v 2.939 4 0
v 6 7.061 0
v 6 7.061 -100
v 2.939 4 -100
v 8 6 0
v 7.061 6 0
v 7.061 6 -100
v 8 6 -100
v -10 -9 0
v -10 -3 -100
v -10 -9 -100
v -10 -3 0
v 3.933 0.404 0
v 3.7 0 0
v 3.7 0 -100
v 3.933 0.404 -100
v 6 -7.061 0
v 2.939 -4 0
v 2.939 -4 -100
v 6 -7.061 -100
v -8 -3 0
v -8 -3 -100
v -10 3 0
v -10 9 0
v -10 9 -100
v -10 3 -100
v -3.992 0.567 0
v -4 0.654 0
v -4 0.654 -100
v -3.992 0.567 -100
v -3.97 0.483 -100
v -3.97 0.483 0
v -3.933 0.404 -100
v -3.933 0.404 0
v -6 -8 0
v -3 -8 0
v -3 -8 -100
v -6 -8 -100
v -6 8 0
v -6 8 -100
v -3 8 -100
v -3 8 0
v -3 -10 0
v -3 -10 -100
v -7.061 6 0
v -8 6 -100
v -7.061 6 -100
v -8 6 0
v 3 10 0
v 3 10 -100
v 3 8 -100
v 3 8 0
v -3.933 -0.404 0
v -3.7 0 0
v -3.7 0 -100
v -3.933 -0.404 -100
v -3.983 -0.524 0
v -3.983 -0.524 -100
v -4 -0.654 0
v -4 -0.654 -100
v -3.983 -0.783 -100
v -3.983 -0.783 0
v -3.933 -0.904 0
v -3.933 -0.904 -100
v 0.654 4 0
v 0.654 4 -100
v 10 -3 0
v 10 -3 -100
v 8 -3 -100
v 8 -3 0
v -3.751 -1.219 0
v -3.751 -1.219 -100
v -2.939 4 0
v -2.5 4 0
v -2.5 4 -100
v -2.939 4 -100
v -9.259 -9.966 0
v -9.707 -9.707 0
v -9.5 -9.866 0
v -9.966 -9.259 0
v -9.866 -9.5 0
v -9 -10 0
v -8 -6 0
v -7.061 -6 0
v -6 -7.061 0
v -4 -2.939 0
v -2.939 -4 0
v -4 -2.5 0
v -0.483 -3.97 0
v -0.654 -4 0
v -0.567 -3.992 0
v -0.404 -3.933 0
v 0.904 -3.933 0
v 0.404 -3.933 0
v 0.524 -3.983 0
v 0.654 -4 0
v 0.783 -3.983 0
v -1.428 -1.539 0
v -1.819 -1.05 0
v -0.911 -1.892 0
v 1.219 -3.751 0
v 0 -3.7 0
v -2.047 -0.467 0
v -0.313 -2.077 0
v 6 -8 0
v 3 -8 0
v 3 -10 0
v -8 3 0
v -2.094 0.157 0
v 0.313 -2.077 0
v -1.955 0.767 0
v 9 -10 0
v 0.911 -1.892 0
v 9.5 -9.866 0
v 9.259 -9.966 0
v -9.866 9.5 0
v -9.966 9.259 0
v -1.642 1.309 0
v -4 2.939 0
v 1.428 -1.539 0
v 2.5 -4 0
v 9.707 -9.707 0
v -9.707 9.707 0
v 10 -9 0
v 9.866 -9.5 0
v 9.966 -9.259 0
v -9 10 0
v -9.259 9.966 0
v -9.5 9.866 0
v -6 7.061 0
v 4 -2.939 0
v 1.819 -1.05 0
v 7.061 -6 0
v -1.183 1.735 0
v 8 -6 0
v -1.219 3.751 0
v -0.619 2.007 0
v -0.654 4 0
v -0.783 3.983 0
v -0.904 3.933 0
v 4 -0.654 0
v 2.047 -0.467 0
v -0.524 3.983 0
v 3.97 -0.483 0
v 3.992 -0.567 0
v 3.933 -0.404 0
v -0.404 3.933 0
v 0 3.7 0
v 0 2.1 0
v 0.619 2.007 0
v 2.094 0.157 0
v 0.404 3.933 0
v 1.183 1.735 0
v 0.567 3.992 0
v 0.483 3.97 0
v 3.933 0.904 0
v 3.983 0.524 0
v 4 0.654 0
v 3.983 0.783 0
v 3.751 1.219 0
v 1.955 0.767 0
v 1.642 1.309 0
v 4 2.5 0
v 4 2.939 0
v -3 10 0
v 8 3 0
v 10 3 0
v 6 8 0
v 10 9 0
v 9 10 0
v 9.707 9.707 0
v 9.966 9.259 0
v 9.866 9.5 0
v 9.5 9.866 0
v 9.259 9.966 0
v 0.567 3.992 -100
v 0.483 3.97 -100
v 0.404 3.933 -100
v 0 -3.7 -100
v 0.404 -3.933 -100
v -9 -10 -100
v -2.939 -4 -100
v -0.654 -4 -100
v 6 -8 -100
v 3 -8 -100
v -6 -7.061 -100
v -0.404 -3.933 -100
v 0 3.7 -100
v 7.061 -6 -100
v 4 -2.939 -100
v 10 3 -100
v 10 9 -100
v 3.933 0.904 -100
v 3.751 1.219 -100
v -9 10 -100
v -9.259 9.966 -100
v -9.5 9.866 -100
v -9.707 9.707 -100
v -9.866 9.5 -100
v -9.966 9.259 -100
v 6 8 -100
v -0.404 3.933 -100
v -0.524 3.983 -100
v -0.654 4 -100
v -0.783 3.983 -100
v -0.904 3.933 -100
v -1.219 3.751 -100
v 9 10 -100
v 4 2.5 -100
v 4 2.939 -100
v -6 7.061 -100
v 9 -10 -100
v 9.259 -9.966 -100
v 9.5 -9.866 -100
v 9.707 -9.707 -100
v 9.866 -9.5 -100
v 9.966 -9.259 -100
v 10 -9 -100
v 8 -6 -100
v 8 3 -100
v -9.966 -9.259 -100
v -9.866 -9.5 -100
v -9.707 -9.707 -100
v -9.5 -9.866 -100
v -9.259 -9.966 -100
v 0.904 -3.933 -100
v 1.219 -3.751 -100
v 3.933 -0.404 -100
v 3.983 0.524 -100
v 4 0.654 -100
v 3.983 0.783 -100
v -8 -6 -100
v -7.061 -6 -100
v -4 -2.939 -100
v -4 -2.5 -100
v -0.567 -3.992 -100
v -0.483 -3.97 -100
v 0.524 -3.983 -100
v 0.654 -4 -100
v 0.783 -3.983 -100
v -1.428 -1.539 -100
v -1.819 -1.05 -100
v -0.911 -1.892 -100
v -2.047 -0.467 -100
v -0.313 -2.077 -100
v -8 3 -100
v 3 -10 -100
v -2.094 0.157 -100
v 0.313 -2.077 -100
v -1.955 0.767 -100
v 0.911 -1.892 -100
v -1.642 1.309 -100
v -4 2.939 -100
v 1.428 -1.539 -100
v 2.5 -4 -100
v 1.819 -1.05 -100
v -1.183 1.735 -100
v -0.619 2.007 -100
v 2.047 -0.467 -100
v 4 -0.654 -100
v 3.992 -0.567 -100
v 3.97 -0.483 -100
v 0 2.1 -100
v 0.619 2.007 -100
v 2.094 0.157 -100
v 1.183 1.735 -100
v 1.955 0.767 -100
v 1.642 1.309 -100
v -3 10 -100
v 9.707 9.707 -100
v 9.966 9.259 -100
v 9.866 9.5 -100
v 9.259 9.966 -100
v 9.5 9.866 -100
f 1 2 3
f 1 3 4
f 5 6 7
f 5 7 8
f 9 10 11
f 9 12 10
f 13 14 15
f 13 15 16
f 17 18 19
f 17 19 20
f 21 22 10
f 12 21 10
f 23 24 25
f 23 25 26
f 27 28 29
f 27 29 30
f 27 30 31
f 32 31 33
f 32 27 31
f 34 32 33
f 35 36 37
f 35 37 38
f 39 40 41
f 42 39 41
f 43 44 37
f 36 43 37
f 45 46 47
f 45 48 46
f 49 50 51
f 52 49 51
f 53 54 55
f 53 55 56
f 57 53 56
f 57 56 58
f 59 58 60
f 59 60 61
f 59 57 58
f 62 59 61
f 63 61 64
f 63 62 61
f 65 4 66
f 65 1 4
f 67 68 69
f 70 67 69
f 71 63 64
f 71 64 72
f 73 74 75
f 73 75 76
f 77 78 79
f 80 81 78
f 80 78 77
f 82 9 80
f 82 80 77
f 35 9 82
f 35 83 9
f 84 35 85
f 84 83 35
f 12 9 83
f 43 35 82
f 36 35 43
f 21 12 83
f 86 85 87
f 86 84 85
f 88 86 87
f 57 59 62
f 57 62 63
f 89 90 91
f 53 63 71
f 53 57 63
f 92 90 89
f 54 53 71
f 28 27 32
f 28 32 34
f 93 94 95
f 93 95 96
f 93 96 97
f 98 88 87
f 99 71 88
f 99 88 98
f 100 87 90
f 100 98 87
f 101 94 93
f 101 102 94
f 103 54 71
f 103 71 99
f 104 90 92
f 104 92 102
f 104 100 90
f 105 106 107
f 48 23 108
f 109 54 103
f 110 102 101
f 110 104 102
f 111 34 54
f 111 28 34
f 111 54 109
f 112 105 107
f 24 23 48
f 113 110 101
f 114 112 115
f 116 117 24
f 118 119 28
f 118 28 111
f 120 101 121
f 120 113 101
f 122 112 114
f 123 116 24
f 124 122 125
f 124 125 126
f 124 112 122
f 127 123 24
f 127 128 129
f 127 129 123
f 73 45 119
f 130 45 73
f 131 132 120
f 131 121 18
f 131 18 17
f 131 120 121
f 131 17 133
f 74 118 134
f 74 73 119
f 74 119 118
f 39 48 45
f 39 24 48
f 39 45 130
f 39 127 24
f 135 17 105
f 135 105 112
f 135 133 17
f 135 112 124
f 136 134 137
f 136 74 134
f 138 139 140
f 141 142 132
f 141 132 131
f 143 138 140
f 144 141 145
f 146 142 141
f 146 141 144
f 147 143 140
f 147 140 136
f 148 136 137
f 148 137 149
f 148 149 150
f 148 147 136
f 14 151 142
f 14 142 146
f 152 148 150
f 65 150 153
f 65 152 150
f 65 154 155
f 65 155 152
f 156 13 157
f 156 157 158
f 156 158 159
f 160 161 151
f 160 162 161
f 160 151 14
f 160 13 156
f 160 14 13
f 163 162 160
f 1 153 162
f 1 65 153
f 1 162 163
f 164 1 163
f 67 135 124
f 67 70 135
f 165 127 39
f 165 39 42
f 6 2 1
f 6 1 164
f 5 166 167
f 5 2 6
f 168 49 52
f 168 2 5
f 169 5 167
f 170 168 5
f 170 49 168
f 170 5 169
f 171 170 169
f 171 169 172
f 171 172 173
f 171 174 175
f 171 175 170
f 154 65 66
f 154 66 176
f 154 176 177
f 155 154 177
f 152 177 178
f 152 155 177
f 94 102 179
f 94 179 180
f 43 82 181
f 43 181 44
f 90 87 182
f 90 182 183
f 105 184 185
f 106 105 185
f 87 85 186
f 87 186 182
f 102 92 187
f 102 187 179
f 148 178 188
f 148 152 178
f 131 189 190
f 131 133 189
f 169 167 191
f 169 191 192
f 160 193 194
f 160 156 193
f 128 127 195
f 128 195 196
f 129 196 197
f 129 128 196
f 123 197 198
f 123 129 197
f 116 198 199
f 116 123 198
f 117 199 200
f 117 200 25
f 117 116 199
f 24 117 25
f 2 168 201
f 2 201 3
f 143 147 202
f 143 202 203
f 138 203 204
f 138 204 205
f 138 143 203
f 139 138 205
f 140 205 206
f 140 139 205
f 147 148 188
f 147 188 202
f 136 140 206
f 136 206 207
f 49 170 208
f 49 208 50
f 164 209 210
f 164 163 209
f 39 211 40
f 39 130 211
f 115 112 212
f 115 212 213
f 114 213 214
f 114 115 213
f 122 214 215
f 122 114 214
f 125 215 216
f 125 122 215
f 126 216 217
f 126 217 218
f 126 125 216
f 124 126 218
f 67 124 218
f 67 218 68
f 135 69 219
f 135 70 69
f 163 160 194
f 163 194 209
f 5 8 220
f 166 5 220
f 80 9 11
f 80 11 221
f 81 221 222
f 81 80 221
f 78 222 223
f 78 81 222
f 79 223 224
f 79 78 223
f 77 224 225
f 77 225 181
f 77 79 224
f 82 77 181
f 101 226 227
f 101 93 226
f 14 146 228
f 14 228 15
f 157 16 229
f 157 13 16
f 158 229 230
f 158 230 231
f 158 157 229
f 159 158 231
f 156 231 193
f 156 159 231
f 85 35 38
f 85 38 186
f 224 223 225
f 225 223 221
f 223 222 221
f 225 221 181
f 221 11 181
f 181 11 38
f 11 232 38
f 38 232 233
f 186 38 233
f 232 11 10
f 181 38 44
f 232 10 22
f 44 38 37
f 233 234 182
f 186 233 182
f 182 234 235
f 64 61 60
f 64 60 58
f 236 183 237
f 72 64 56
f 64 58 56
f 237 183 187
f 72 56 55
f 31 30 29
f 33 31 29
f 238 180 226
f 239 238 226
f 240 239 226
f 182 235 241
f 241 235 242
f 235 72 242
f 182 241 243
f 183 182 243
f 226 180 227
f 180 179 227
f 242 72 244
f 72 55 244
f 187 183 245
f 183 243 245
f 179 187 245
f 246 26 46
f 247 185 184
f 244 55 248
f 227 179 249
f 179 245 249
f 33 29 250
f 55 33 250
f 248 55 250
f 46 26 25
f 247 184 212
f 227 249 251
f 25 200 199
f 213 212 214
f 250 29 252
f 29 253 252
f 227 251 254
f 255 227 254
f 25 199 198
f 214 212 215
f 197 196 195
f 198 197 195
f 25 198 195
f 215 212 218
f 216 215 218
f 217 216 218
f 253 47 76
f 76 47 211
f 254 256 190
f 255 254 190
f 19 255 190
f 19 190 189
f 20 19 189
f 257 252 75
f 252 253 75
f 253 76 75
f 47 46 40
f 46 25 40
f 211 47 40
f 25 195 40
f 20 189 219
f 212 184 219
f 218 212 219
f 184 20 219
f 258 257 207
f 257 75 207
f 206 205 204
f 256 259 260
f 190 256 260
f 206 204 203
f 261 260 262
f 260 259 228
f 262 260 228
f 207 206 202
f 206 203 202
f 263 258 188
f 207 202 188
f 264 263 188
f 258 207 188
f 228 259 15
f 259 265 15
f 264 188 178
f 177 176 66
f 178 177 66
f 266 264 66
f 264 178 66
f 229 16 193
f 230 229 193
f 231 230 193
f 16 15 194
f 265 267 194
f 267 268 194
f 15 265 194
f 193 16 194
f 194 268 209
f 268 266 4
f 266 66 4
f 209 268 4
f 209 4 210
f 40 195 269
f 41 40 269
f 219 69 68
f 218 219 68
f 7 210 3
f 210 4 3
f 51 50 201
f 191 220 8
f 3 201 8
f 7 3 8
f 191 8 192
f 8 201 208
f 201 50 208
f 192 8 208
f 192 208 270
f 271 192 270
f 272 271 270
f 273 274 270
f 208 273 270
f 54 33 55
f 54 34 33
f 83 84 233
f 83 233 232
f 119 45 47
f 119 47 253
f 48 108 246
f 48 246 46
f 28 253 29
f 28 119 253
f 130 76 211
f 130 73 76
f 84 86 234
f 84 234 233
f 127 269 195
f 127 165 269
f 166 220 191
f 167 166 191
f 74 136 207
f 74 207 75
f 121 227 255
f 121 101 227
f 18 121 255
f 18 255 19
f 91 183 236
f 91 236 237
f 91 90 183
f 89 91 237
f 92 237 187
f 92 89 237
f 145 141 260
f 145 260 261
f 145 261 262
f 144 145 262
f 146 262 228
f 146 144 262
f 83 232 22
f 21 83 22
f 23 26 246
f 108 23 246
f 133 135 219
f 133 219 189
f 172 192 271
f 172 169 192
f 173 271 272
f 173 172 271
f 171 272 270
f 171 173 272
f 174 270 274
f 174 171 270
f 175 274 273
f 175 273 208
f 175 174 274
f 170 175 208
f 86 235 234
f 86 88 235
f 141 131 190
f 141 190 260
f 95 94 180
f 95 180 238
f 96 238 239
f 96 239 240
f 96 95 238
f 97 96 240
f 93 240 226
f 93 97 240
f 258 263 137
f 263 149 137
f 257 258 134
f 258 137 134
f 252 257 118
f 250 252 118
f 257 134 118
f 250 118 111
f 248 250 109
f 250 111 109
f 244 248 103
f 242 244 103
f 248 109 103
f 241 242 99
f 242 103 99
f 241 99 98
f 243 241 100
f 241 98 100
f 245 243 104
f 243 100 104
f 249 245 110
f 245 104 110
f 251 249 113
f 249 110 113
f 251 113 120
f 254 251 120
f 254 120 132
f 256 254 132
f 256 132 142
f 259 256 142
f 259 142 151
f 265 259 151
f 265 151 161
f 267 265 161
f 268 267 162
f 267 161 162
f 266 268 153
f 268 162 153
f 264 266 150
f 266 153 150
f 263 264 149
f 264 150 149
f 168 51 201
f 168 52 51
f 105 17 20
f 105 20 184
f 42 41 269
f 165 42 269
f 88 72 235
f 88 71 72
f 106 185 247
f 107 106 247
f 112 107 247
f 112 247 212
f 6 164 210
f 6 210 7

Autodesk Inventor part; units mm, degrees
sketch "Sketch_75" plane through (0, 0, 0) normal (0, 0, 1) x (1, 0, 0)
  line L0 (-10, -3) -> (-10, -9)
  arc A0 (-10, -9) -> (-9, -10) centre (-9, -9) ccw
  line L1 (-9, -10) -> (-3, -10)
  line L2 (-3, -10) -> (-3, -8)
  line L3 (-3, -8) -> (-6, -8)
  line L4 (-6, -8) -> (-6, -7.0607)
  line L5 (-6, -7.0607) -> (-2.9393, -4)
  line L6 (-2.9393, -4) -> (-0.6536, -4)
  arc A1 (-0.6536, -4) -> (-0.4036, -3.933) centre (-0.6536, -3.5) ccw
  line L7 (-0.4036, -3.933) -> (0, -3.7)
  line L8 (0, -3.7) -> (0.4036, -3.933)
  arc A2 (0.4036, -3.933) -> (0.9036, -3.933) centre (0.6536, -3.5) ccw
  line L9 (0.9036, -3.933) -> (1.2189, -3.751)
  line L10 (1.2189, -3.751) -> (2.5, -4)
  line L11 (2.5, -4) -> (2.9393, -4)
  line L12 (2.9393, -4) -> (6, -7.0607)
  line L13 (6, -7.0607) -> (6, -8)
  line L14 (6, -8) -> (3, -8)
  line L15 (3, -8) -> (3, -10)
  line L16 (3, -10) -> (9, -10)
  arc A3 (9, -10) -> (10, -9) centre (9, -9) ccw
  line L17 (10, -9) -> (10, -3)
  line L18 (10, -3) -> (8, -3)
  line L19 (8, -3) -> (8, -6)
  line L20 (8, -6) -> (7.0607, -6)
  line L21 (7.0607, -6) -> (4, -2.9393)
  line L22 (4, -2.9393) -> (4, -0.6536)
  arc A4 (4, -0.6536) -> (3.933, -0.4036) centre (3.5, -0.6536) ccw
  line L23 (3.933, -0.4036) -> (3.7, 0)
  line L24 (3.7, 0) -> (3.933, 0.4036)
  arc A5 (3.933, 0.4036) -> (3.933, 0.9036) centre (3.5, 0.6536) ccw
  line L25 (3.933, 0.9036) -> (3.751, 1.2189)
  line L26 (3.751, 1.2189) -> (4, 2.5)
  line L27 (4, 2.5) -> (4, 2.9393)
  line L28 (4, 2.9393) -> (7.0607, 6)
  line L29 (7.0607, 6) -> (8, 6)
  line L30 (8, 6) -> (8, 3)
  line L31 (8, 3) -> (10, 3)
  line L32 (10, 3) -> (10, 9)
  arc A6 (10, 9) -> (9, 10) centre (9, 9) ccw
  line L33 (9, 10) -> (3, 10)
  line L34 (3, 10) -> (3, 8)
  line L35 (3, 8) -> (6, 8)
  line L36 (6, 8) -> (6, 7.0607)
  line L37 (6, 7.0607) -> (2.9393, 4)
  line L38 (2.9393, 4) -> (0.6536, 4)
  arc A7 (0.6536, 4) -> (0.4036, 3.933) centre (0.6536, 3.5) ccw
  line L39 (0.4036, 3.933) -> (0, 3.7)
  line L40 (0, 3.7) -> (-0.4036, 3.933)
  arc A8 (-0.4036, 3.933) -> (-0.9036, 3.933) centre (-0.6536, 3.5) ccw
  line L41 (-0.9036, 3.933) -> (-1.2189, 3.751)
  line L42 (-1.2189, 3.751) -> (-2.5, 4)
  line L43 (-2.5, 4) -> (-2.9393, 4)
  line L44 (-2.9393, 4) -> (-6, 7.0607)
  line L45 (-6, 7.0607) -> (-6, 8)
  line L46 (-6, 8) -> (-3, 8)
  line L47 (-3, 8) -> (-3, 10)
  line L48 (-3, 10) -> (-9, 10)
  arc A9 (-9, 10) -> (-10, 9) centre (-9, 9) ccw
  line L49 (-10, 9) -> (-10, 3)
  line L50 (-10, 3) -> (-8, 3)
  line L51 (-8, 3) -> (-8, 6)
  line L52 (-8, 6) -> (-7.0607, 6)
  line L53 (-7.0607, 6) -> (-4, 2.9393)
  line L54 (-4, 2.9393) -> (-4, 0.6536)
  arc A10 (-4, 0.6536) -> (-3.933, 0.4036) centre (-3.5, 0.6536) ccw
  line L55 (-3.933, 0.4036) -> (-3.7, 0)
  line L56 (-3.7, 0) -> (-3.933, -0.4036)
  arc A11 (-3.933, -0.4036) -> (-3.933, -0.9036) centre (-3.5, -0.6536) ccw
  line L57 (-3.933, -0.9036) -> (-3.751, -1.2189)
  line L58 (-3.751, -1.2189) -> (-4, -2.5)
  line L59 (-4, -2.5) -> (-4, -2.9393)
  line L60 (-4, -2.9393) -> (-7.0607, -6)
  line L61 (-7.0607, -6) -> (-8, -6)
  line L62 (-8, -6) -> (-8, -3)
  line L63 (-8, -3) -> (-10, -3)
extrude "Extrusion1" add sketch "Sketch_75" against normal blind 100
sketch "Sketch2" plane through (0, 0, -100) normal (0, 0, -1) x (-1, 0, 0)
  point P0 (0, 0)
hole "Hole1" at (0, 0, -100) direction (0, 0, 1) diameter 4.2 depth 100
ref_plane "C1_XY" through (0, 0, 0) normal (0, 0, 1) x (1, 0, 0)
ref_plane "C1_YZ" through (0, 0, 0) normal (1, 0, 0) x (0, 1, 0)
ref_plane "C1_ZX" through (0, 0, 0) normal (0, 1, 0) x (0, 0, 1)
properties part number "NFS5-2020-100" material "アルミニウム 6061"
